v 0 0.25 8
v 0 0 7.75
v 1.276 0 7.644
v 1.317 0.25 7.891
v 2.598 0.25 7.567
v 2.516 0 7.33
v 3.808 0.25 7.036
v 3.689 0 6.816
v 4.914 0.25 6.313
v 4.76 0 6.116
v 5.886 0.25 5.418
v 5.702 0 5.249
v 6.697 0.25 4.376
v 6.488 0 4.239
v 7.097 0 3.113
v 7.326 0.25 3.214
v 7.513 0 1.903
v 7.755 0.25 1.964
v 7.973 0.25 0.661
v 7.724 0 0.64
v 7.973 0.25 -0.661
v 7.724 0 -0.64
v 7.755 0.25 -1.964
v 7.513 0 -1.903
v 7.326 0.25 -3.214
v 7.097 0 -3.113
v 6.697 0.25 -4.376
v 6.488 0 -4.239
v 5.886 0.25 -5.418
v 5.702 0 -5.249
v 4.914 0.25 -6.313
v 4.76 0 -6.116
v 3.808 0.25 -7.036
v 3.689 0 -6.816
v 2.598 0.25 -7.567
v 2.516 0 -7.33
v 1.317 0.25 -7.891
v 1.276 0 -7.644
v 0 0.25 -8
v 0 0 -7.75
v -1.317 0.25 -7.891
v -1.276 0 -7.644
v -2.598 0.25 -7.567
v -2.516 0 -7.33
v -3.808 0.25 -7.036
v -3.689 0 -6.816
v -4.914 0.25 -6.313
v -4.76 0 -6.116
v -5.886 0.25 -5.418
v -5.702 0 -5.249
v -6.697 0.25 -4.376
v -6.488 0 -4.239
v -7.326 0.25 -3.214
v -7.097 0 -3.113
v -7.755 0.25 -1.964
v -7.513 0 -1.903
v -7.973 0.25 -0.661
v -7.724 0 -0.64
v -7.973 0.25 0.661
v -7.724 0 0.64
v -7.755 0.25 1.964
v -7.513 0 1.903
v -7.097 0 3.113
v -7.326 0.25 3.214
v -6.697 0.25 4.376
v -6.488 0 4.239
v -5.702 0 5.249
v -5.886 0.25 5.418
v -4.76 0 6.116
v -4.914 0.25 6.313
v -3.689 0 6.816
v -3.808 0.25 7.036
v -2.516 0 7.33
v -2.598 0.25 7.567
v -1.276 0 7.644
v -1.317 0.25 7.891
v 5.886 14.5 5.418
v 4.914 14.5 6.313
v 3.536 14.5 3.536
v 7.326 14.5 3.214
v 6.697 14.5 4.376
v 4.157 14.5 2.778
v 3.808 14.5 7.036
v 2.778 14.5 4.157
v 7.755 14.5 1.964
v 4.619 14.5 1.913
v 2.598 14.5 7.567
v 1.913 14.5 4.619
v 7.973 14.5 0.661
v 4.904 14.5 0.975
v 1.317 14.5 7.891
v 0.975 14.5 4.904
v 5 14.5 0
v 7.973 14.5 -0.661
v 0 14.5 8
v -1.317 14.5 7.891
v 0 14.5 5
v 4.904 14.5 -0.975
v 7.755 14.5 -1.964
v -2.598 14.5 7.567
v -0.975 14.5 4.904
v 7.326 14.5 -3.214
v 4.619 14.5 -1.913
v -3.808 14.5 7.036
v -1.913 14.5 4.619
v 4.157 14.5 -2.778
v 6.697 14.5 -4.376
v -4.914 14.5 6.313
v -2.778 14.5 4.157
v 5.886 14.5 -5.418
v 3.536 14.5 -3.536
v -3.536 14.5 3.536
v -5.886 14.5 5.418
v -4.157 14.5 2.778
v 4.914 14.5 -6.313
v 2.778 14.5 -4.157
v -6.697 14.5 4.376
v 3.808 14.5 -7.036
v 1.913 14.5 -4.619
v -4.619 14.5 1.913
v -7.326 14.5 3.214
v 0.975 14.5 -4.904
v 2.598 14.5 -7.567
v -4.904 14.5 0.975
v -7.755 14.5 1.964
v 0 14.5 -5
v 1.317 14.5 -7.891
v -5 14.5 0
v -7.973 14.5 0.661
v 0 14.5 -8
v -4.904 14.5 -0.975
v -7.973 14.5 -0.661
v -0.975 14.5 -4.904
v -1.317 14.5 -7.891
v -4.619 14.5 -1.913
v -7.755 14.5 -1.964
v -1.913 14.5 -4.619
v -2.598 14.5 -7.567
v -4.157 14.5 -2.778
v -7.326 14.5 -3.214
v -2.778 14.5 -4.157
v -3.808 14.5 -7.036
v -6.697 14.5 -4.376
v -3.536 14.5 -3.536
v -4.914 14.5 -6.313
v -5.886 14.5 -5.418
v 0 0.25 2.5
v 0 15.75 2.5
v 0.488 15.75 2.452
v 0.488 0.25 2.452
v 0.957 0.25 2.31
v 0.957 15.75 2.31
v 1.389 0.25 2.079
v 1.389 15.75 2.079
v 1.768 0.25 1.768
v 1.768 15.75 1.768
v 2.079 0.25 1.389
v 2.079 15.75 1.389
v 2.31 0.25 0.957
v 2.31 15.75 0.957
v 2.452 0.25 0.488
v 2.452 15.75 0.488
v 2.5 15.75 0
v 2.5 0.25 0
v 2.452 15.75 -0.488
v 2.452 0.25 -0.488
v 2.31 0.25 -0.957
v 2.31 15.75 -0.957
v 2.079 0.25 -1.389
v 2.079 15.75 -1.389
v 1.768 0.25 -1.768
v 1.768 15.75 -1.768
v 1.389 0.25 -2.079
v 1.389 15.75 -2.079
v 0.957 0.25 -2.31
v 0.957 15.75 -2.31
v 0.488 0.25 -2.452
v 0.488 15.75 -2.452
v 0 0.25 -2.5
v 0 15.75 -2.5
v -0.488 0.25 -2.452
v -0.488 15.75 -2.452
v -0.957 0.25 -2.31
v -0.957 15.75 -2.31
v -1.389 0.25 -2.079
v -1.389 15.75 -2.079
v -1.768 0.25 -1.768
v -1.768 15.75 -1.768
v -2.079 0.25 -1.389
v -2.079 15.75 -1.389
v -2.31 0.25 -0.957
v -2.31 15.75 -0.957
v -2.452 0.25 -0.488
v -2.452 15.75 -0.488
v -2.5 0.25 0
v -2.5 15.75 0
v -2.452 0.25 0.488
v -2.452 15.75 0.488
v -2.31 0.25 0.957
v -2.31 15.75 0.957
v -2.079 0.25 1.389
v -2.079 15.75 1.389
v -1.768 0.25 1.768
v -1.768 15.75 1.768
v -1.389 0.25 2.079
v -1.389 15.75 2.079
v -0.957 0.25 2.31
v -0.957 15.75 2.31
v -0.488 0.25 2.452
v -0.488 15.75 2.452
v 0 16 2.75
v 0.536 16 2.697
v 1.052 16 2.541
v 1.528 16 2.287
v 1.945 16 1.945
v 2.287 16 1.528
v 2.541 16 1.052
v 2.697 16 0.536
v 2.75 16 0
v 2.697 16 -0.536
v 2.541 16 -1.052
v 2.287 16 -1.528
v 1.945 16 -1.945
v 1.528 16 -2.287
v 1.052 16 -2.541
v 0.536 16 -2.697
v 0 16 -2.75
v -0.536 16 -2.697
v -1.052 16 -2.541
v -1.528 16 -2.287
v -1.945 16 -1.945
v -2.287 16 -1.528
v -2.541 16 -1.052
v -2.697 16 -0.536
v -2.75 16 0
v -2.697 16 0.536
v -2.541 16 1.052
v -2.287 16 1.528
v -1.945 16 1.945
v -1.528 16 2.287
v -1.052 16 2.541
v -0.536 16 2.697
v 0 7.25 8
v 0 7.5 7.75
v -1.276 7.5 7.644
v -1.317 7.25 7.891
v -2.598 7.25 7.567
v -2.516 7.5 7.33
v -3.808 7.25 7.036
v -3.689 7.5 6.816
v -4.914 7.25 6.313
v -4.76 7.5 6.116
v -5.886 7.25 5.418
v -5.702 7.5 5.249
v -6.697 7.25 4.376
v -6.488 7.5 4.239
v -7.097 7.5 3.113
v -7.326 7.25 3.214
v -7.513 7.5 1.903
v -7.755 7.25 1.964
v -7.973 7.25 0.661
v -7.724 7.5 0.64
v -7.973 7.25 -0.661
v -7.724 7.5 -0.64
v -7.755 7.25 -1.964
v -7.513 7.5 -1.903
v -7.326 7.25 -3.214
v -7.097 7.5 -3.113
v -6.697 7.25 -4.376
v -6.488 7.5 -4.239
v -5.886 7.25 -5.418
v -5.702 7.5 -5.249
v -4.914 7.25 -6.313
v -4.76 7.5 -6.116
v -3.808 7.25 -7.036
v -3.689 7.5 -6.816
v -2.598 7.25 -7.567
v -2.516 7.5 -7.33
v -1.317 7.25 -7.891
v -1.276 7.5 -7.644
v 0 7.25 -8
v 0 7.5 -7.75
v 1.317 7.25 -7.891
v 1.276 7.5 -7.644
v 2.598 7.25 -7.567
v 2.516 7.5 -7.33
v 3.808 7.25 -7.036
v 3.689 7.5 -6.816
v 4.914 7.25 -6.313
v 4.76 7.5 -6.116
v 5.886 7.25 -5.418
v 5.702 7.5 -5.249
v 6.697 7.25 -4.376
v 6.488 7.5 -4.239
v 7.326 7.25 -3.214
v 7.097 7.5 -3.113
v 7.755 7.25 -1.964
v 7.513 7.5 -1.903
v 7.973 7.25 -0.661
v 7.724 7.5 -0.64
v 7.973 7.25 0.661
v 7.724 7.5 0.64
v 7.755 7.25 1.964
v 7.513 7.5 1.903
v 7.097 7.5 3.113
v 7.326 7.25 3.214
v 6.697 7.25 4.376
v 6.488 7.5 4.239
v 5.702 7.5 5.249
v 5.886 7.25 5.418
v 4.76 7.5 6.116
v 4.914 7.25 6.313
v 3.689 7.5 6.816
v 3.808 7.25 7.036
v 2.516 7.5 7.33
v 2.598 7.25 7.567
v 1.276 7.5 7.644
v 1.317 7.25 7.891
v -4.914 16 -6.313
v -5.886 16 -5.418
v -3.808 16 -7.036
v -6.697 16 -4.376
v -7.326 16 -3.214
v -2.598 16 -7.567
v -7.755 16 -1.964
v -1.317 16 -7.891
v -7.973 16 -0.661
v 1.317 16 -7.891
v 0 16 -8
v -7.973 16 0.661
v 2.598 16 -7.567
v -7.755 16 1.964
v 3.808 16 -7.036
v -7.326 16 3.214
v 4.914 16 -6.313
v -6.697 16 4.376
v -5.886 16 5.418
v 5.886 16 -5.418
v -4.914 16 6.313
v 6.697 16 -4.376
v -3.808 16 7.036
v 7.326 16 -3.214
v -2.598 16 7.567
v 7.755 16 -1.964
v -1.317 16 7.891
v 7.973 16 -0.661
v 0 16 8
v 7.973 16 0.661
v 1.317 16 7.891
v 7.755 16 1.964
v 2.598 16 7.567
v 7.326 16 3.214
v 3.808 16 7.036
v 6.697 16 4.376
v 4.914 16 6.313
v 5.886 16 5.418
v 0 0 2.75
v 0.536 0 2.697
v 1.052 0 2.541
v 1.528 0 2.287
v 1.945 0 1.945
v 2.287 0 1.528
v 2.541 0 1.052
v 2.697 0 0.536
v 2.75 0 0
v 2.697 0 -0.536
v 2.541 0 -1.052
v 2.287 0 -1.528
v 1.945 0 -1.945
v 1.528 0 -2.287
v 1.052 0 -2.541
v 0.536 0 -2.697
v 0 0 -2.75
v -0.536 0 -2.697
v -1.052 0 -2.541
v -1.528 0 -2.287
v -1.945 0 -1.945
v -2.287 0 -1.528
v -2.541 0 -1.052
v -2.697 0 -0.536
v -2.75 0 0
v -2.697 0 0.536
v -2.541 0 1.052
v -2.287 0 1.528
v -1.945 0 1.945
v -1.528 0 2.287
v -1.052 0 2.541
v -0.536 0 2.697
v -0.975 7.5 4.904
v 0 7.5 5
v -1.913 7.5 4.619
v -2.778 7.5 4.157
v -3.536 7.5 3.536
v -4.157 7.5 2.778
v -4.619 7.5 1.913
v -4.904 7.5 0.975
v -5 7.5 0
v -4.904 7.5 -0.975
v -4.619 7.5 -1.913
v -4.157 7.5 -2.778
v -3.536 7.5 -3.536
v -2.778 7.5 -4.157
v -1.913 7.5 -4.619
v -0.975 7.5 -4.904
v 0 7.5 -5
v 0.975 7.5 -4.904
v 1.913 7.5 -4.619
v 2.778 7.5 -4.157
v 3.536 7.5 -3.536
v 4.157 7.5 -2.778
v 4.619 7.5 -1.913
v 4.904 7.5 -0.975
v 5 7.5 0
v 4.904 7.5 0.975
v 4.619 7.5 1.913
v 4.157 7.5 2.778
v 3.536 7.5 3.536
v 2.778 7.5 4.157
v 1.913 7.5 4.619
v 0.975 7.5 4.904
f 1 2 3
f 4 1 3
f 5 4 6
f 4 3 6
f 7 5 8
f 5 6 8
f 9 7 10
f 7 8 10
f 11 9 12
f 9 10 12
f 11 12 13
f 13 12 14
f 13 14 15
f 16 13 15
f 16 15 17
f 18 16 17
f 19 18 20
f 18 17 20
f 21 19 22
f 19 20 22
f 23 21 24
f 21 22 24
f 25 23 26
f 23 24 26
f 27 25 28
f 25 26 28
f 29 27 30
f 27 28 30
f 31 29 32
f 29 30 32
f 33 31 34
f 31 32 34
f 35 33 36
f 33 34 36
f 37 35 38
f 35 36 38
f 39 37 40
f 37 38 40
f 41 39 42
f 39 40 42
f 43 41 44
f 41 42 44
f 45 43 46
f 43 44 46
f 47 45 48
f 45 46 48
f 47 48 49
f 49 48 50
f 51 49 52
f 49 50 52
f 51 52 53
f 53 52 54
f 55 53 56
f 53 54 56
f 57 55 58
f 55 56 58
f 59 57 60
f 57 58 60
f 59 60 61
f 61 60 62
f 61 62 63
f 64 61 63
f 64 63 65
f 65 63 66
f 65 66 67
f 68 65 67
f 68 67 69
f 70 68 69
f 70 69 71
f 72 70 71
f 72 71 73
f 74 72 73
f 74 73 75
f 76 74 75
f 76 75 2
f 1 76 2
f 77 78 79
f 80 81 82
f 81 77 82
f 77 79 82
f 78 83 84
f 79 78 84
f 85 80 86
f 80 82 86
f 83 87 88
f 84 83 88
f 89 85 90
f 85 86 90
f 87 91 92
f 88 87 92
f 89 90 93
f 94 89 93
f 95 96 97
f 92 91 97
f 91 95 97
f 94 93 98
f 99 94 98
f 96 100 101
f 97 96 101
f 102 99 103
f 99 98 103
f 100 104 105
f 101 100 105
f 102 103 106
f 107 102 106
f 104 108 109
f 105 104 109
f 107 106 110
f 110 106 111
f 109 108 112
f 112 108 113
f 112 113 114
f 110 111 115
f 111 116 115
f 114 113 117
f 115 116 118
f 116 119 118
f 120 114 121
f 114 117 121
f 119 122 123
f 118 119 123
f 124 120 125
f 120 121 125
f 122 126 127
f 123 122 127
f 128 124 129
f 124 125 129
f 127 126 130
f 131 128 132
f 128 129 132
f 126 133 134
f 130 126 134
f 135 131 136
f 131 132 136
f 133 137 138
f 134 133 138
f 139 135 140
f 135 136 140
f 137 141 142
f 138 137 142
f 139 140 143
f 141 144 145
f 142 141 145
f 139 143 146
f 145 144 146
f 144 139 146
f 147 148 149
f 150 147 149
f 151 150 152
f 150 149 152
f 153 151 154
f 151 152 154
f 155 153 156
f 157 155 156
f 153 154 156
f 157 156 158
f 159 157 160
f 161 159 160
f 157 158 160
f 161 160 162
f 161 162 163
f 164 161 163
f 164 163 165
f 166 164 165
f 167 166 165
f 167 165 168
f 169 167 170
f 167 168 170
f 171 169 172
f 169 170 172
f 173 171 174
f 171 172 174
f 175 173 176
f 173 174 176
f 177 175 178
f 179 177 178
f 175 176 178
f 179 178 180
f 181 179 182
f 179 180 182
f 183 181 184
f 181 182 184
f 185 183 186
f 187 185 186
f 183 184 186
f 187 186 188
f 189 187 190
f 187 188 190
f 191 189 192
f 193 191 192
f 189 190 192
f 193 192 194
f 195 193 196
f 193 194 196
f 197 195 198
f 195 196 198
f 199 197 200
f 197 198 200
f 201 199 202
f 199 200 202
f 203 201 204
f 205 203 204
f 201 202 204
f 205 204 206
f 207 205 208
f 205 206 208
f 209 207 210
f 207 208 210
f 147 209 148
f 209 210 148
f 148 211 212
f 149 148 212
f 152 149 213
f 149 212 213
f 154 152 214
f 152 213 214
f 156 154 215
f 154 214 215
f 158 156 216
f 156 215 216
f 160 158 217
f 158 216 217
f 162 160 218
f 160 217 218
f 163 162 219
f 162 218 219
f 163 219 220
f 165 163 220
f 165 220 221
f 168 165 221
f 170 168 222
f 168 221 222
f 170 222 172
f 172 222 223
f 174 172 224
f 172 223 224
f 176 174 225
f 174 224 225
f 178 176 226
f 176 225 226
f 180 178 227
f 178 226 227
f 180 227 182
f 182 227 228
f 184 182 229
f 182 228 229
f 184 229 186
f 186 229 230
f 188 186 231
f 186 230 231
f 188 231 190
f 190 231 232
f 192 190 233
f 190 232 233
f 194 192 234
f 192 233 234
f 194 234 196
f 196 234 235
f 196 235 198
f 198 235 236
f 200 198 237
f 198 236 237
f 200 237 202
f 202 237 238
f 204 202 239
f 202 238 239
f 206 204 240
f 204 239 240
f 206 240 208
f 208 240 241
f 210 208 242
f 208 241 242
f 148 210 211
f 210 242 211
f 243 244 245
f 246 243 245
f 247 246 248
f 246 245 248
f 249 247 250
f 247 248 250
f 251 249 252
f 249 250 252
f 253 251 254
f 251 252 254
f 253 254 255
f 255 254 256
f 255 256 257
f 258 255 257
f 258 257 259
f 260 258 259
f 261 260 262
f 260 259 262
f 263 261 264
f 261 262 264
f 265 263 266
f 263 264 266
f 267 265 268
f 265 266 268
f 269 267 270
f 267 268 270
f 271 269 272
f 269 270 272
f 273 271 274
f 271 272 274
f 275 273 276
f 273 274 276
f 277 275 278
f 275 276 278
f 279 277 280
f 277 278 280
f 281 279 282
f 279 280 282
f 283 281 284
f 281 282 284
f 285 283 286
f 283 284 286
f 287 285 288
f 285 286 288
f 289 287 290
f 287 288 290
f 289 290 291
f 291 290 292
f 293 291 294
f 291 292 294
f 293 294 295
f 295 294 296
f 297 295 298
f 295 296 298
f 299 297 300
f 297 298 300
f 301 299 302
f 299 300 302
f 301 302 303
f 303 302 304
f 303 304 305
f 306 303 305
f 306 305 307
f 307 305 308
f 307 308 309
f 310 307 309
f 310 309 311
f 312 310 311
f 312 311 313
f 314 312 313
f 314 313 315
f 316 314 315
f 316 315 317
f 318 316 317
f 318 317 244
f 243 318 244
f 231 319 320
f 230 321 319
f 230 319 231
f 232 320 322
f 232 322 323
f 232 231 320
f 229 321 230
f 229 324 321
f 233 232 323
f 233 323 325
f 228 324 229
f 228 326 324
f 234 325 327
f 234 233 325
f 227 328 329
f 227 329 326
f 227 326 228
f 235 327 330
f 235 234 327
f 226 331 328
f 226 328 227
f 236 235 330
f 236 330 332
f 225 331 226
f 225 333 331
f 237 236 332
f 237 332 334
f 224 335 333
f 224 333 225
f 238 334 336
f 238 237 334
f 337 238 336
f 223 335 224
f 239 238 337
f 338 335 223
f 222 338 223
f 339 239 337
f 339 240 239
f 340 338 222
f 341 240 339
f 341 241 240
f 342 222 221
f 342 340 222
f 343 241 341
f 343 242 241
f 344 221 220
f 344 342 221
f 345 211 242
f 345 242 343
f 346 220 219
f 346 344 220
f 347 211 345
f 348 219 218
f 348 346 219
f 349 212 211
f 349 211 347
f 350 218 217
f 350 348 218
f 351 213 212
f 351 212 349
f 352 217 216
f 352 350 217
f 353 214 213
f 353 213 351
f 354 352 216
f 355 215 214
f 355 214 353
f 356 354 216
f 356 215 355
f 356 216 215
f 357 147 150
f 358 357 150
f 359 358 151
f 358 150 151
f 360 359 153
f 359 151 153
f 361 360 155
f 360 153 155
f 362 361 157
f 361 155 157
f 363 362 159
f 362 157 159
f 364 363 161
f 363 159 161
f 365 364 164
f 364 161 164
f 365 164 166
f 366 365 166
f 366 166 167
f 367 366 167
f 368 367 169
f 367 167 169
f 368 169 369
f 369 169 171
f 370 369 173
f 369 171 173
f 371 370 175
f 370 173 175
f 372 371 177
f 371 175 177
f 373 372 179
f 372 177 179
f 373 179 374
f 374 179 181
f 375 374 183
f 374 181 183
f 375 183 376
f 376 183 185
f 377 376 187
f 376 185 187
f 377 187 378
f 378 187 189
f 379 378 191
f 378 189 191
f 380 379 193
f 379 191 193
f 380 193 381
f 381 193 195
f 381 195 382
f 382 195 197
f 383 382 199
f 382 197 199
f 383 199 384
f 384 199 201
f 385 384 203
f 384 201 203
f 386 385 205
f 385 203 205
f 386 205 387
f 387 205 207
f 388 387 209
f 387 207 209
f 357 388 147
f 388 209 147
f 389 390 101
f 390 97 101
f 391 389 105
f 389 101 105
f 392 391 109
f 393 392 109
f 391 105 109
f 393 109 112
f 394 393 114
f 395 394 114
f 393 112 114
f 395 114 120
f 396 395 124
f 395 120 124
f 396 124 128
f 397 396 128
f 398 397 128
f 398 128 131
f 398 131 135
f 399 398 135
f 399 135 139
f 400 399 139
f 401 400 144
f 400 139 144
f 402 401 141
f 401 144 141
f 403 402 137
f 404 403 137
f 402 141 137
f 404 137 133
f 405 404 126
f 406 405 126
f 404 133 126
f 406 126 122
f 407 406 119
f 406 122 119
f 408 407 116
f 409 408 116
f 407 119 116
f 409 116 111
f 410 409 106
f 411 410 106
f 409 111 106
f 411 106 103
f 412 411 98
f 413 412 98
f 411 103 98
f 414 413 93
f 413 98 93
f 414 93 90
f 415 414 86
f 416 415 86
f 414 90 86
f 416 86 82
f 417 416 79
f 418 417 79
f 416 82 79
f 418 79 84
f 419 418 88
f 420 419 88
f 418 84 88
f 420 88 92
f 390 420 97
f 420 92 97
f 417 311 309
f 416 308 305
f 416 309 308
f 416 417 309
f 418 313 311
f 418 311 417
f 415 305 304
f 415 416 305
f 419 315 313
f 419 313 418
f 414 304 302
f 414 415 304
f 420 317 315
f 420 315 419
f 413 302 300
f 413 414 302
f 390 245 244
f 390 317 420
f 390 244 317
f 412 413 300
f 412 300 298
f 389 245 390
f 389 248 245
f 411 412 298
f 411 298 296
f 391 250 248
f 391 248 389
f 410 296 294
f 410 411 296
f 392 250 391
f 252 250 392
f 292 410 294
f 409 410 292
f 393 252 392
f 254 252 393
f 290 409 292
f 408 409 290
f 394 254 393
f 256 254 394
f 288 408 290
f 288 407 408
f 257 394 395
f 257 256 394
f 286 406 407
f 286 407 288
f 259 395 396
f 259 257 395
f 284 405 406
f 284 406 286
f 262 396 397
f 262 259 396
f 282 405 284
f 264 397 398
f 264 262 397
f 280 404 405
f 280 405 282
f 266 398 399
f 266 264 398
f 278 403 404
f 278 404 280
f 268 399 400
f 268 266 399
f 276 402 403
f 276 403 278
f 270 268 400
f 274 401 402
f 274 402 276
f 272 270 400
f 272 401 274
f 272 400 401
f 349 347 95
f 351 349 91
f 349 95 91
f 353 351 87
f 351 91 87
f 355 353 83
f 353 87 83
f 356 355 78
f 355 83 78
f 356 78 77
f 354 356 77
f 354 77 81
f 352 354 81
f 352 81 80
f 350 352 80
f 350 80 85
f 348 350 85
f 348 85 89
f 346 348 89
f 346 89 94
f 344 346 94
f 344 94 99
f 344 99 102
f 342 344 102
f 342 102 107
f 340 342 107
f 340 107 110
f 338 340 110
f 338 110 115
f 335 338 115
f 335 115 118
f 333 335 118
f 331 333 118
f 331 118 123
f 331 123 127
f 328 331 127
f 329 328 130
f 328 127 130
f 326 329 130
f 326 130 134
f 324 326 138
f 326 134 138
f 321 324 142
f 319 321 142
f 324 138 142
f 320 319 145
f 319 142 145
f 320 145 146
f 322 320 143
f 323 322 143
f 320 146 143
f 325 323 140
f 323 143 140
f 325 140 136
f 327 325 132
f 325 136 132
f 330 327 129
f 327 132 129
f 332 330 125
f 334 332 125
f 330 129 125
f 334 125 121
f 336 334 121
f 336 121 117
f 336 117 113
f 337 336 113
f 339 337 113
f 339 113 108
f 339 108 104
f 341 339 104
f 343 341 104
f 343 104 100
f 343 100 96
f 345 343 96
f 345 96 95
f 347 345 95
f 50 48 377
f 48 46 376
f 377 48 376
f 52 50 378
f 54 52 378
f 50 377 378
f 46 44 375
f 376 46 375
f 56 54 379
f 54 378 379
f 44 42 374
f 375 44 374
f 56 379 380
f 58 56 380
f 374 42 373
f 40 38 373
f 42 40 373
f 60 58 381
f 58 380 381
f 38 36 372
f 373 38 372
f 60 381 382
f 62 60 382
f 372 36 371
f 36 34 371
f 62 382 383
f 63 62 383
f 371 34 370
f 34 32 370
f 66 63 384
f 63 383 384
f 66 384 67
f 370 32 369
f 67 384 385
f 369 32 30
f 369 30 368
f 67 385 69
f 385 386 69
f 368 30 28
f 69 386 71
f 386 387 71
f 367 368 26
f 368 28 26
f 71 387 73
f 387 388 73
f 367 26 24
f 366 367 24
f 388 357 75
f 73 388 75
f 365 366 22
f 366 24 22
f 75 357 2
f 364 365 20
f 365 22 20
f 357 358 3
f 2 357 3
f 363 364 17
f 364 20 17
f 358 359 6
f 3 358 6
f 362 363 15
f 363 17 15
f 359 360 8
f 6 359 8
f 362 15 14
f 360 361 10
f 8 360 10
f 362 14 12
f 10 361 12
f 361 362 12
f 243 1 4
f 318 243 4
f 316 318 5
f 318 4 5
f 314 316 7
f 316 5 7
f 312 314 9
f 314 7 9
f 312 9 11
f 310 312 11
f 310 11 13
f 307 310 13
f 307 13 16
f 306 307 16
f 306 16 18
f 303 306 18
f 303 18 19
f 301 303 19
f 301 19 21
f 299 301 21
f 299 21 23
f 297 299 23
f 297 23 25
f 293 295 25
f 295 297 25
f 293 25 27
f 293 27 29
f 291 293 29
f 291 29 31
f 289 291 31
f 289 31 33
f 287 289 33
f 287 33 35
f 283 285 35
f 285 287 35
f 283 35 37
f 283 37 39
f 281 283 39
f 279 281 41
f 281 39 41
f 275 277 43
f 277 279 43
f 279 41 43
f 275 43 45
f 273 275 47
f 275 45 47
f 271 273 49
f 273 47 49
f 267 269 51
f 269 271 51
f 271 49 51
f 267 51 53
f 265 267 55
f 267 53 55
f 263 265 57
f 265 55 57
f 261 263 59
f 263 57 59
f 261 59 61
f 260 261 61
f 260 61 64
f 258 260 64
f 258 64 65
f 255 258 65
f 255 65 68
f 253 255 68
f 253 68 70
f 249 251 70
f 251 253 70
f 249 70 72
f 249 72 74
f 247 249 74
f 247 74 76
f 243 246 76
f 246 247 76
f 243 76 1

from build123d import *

# Parameters (mm, degrees)
SKETCH1_R           = 8
BOSS_EXTRUDE1_DEPTH = 16
SKETCH2_R           = 2.5
CUT_EXTRUDE1_DEPTH  = 16
SKETCH3_W           = 3
SKETCH3_H           = 7
CHAMFER1_SIZE       = 0.25


with BuildPart() as part:
    # Sketch1 → Boss-Extrude1 (new body)
    with BuildSketch(Plane(origin=(0, 0, 0), x_dir=(1, 0, 0), z_dir=(0, 1, 0))):
        with Locations(Location((0, 0, 0), (0, 0, 270))):
            Circle(SKETCH1_R)
    extrude(amount=BOSS_EXTRUDE1_DEPTH)

    # Sketch2 → Cut-Extrude1 (cut)
    with BuildSketch(Plane(origin=(0, 16, 0), x_dir=(1, 0, 0), z_dir=(0, 1, 0))):
        with Locations(Location((0, 0, 0), (0, 0, 270))):
            Circle(SKETCH2_R)
    extrude(amount=-CUT_EXTRUDE1_DEPTH, mode=Mode.SUBTRACT)

    # Sketch3 → Cut-Revolve1 (revolve, cut)
    with BuildSketch(Plane.XY, mode=Mode.PRIVATE) as cut_revolve1_sk:
        with Locations((6.5, 11)):
            Rectangle(SKETCH3_W, SKETCH3_H)
    revolve(cut_revolve1_sk.sketch.rotate(Axis((0, 16, 0), (0, -1, 0)), 90), axis=Axis((0, 16, 0), (0, -1, 0)), mode=Mode.SUBTRACT)

    # Chamfer1
    chamfer1_edges = [part.edges().sort_by_distance(p)[0] for p in [
        (0, 7.5, -8),
        (0, 0, -8),
        (0, 16, -2.5),
        (0, 0, -2.5),
    ]]
    chamfer(chamfer1_edges, length=CHAMFER1_SIZE)


solid = part.part
